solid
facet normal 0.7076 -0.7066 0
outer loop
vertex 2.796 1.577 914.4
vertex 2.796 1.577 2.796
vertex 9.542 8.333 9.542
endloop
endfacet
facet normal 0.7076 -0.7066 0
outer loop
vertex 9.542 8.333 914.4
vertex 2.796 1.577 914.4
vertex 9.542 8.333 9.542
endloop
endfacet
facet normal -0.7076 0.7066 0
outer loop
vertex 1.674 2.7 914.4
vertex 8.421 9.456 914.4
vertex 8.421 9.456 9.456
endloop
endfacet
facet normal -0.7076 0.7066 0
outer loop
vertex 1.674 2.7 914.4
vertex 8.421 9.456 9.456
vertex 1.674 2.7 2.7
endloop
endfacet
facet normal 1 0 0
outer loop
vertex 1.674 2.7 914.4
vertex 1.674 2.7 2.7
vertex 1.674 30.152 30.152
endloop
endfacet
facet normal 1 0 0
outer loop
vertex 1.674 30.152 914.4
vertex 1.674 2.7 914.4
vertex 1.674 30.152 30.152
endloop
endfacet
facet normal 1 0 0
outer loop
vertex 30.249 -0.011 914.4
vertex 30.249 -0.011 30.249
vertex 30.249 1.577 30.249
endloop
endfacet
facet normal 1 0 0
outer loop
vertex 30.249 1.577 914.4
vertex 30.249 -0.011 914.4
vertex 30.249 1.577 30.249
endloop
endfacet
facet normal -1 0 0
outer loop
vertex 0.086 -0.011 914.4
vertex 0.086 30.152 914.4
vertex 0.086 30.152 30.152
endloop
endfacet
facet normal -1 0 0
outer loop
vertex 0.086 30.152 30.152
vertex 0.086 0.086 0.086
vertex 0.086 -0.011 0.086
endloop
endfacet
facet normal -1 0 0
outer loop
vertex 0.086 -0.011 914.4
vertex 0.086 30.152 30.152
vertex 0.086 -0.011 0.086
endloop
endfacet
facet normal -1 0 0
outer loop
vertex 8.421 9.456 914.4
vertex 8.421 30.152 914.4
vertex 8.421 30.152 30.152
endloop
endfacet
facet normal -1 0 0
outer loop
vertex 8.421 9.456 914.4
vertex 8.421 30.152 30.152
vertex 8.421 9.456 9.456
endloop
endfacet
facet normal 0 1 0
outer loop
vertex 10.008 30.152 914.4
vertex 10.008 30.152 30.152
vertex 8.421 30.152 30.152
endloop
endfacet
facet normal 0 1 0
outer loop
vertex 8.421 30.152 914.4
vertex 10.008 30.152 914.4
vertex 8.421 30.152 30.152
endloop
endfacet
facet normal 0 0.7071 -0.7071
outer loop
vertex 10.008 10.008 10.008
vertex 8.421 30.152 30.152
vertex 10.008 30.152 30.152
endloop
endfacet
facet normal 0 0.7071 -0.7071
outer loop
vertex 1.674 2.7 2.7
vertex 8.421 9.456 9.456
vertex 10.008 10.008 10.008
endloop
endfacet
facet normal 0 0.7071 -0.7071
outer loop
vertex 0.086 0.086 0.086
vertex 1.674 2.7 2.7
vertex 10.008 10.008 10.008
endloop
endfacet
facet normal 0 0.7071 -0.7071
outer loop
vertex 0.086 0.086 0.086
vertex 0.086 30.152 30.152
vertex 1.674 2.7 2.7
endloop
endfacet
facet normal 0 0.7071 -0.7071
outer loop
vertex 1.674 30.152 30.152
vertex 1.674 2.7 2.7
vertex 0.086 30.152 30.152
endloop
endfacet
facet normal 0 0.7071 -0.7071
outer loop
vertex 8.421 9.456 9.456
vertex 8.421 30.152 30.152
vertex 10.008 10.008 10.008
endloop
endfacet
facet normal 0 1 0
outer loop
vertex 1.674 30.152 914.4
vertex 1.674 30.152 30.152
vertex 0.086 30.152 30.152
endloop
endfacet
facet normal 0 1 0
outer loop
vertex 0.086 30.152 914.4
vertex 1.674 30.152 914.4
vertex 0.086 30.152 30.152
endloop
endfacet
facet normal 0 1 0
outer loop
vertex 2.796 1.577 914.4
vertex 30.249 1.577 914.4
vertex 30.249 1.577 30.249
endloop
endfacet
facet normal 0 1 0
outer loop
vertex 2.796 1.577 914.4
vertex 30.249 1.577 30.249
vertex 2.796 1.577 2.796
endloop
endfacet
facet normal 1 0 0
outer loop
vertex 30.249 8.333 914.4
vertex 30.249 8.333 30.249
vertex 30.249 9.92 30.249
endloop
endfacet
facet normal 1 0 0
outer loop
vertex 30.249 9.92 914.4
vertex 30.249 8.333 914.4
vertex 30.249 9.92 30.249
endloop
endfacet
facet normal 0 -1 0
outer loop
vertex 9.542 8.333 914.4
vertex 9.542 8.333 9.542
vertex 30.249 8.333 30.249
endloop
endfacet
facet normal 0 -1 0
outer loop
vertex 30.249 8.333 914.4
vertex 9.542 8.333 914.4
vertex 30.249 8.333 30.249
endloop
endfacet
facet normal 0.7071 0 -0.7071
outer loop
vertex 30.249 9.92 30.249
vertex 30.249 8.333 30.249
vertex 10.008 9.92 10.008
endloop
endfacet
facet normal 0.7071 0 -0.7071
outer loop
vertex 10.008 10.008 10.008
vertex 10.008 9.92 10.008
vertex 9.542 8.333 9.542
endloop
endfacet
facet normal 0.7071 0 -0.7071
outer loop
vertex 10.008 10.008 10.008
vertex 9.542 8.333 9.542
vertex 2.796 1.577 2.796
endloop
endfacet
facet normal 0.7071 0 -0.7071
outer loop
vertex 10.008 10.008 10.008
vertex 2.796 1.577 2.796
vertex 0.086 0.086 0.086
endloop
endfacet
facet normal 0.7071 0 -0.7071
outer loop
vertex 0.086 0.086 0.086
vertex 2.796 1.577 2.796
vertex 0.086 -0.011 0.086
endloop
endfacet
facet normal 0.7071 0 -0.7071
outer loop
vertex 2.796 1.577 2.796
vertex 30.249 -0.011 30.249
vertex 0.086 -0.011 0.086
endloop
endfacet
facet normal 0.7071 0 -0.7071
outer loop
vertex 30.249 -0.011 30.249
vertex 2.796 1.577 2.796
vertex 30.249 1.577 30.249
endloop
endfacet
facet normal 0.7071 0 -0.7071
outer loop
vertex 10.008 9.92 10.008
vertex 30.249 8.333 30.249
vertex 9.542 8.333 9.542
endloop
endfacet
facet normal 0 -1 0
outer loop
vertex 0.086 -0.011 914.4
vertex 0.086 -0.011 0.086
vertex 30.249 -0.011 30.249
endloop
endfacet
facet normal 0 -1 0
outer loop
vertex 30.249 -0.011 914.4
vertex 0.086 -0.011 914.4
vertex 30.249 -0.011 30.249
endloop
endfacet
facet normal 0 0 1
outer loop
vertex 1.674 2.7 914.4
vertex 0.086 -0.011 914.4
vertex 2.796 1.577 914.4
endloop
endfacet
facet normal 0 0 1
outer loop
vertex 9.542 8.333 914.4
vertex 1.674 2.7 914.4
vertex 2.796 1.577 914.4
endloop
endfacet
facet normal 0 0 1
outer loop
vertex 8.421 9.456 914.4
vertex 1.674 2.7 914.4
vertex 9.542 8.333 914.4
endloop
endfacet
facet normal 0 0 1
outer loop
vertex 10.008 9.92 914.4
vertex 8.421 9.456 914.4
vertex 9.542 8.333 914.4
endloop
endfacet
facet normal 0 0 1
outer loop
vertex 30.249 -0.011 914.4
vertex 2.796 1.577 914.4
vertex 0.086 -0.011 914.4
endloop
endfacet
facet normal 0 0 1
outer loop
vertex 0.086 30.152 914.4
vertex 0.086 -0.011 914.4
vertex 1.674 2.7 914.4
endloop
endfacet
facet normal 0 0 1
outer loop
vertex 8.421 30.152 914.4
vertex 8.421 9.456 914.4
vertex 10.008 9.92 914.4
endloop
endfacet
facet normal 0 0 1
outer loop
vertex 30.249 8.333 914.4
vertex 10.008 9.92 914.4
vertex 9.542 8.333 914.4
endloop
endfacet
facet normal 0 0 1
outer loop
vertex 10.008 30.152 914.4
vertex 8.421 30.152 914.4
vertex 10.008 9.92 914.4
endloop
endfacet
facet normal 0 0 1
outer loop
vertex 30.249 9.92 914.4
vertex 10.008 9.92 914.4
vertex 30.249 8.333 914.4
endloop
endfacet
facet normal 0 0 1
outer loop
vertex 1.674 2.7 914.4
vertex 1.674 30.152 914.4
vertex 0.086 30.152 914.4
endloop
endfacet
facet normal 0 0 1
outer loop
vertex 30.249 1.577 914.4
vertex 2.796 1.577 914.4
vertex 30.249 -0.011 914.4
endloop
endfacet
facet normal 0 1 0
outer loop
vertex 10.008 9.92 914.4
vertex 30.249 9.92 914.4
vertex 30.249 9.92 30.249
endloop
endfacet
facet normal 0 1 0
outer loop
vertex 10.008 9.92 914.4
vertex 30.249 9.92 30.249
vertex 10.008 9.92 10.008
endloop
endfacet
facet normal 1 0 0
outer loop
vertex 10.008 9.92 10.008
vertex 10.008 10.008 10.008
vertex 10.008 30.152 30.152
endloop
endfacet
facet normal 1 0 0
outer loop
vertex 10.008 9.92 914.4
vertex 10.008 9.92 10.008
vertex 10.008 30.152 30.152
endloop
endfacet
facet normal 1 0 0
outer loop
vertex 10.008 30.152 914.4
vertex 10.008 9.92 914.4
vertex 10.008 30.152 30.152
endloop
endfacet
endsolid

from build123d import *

# Parameters (mm, degrees)
F1_DEPTH      = 914.4
F4_DEPTH      = 50.8
F4_DEPTH_BACK = 25.4
F5_DEPTH      = 50.8


with BuildPart() as f1:
    # F0 (on Top) → F1 (new body)
    with BuildSketch(Plane.XY):
        Polygon((10.0081935422, 9.9204859395), (10.0081935422, 30.1515859395), (8.4206935422, 30.1515859395), (8.4206935422, 9.4563106097), (1.6738185422, 2.6999106097), (1.6738185422, 30.1515859395), (0.0863185422, 30.1515859395), (0.0863185422, -0.0109140605), (30.2488185422, -0.0109140605), (30.2488185422, 1.5765859395), (2.7955595779, 1.5765859395), (9.5424345779, 8.3329859395), (30.2488185422, 8.3329859395), (30.2488185422, 9.9204859395), align=None)
    extrude(amount=F1_DEPTH)

    # F2 (on Front) → F4 (cut, two sides)
    with BuildSketch(Plane.XZ) as f4_sk:
        Polygon((30.48, 30.48), (0, 0), (30.48, 0), align=None)
    extrude(amount=-F4_DEPTH, mode=Mode.SUBTRACT)
    extrude(f4_sk.sketch, amount=F4_DEPTH_BACK, mode=Mode.SUBTRACT)

    # F3 (on Right) → F5 (cut)
    with BuildSketch(Plane.YZ):
        Polygon((30.1625, 30.1625), (0, 0), (30.1625, 0), align=None)
    extrude(amount=F5_DEPTH, mode=Mode.SUBTRACT)


solid = f1.part
